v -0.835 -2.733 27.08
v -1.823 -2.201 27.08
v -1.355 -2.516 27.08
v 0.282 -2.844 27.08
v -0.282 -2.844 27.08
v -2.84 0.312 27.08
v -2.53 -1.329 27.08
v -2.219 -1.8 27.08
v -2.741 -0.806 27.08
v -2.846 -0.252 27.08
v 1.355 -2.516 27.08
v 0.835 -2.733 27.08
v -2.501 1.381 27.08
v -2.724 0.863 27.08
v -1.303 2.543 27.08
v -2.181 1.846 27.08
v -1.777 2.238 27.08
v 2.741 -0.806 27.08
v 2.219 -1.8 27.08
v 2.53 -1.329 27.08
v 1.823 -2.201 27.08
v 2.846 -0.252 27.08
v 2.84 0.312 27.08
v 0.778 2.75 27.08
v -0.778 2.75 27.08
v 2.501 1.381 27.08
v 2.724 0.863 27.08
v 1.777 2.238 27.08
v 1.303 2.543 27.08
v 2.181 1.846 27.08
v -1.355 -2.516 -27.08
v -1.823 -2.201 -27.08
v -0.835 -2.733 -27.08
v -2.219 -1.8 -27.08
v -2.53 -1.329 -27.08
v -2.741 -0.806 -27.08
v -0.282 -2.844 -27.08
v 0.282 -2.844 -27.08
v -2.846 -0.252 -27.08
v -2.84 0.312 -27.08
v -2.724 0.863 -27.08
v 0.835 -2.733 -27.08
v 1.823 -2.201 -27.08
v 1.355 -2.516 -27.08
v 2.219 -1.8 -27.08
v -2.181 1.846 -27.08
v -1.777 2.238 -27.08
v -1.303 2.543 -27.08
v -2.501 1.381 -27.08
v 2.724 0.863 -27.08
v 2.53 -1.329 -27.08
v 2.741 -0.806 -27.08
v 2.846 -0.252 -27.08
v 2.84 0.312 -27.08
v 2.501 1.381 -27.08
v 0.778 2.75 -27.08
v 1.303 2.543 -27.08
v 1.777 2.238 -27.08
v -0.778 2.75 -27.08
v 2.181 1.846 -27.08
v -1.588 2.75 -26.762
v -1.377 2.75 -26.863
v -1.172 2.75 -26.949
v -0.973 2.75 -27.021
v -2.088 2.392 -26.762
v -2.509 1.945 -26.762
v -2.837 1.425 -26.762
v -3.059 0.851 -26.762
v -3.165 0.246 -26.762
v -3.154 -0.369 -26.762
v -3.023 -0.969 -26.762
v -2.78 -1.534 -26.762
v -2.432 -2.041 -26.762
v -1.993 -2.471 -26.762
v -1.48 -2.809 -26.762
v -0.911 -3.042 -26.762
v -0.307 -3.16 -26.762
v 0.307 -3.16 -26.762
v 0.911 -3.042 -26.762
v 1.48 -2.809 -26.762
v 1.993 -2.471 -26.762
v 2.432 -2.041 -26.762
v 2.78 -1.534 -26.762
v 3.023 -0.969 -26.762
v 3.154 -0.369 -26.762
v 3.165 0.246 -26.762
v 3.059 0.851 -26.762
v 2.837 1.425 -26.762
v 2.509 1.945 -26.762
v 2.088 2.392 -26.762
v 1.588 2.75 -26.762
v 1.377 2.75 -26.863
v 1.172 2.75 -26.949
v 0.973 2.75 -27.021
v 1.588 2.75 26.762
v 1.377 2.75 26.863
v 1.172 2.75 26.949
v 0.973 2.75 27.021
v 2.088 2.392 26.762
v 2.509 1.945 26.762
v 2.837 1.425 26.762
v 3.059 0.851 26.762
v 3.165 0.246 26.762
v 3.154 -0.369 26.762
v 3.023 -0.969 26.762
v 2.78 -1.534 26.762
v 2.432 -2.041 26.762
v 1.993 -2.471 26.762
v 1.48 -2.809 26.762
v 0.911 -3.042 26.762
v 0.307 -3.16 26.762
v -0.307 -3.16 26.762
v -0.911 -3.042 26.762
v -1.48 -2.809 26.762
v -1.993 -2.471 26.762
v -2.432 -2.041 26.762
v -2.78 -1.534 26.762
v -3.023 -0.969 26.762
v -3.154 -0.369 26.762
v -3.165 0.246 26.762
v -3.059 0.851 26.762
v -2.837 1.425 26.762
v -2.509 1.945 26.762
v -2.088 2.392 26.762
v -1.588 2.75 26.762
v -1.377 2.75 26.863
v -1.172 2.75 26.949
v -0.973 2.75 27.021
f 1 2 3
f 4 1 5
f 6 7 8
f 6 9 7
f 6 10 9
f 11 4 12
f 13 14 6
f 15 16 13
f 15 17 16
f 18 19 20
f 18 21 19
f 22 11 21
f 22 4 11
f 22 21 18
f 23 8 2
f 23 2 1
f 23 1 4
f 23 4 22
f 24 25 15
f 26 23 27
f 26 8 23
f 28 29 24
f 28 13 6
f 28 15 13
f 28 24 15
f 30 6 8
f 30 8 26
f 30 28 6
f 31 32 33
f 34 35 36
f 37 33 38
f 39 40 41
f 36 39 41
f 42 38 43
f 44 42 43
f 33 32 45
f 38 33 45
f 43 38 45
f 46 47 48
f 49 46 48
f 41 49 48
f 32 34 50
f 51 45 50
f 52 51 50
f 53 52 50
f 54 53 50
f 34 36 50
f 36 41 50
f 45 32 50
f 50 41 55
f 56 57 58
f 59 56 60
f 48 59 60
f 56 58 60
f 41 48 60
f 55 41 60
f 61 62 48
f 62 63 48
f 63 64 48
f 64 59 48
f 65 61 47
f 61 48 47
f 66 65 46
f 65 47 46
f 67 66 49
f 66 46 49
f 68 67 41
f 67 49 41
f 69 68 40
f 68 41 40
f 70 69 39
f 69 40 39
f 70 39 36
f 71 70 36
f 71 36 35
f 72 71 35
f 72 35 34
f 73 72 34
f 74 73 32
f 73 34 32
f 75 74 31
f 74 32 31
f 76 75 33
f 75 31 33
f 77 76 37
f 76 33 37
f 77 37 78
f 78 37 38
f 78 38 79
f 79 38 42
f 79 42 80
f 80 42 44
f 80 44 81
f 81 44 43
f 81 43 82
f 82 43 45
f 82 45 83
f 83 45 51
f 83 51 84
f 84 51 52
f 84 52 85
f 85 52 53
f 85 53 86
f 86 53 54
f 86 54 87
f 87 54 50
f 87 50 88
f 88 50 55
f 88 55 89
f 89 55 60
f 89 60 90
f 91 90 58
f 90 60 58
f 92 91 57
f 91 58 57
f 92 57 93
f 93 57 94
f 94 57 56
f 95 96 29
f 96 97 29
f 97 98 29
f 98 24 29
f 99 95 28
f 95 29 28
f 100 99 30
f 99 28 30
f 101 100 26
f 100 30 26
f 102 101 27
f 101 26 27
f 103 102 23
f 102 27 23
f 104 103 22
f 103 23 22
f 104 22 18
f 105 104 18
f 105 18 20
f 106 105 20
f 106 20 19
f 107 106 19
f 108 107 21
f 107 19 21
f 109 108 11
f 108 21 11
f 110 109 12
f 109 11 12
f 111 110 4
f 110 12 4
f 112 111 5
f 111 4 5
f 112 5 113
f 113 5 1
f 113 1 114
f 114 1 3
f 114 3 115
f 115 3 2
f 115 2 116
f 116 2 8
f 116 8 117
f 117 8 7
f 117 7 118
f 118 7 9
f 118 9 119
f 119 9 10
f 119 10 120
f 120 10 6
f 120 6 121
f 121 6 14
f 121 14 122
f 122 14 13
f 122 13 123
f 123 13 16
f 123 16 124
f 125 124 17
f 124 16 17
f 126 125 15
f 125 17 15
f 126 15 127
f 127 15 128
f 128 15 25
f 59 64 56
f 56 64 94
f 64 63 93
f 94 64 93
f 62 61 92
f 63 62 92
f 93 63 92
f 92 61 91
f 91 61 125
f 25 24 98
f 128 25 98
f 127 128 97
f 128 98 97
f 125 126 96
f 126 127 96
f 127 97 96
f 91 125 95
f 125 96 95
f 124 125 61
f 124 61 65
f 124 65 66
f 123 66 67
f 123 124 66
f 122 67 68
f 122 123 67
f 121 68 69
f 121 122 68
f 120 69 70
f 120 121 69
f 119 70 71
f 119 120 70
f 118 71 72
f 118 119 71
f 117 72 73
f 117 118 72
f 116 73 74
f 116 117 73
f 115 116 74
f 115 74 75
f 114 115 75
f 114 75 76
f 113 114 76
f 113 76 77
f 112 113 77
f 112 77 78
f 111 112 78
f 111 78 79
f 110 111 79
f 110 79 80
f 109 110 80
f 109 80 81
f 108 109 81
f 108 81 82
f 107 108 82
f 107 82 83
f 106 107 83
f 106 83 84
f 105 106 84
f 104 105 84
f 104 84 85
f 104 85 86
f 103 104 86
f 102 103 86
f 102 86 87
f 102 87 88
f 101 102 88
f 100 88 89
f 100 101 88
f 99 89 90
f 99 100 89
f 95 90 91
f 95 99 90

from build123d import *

# Parameters (mm, degrees)
SKETCH3_R                = 3.175
BOSS_EXTRUDE2_DEPTH      = 27.08
BOSS_EXTRUDE2_DEPTH_BACK = 27.08
CUT_EXTRUDE5_DEPTH       = 28.08
CUT_EXTRUDE5_DEPTH_BACK  = 28.08
CHAMFER1_SIZE            = 0.3175


with BuildPart() as part:
    # Sketch3 → Boss-Extrude2 (new body, two sides)
    with BuildSketch(Plane.XY) as boss_extrude2_sk:
        Circle(SKETCH3_R)
    extrude(amount=BOSS_EXTRUDE2_DEPTH)
    extrude(boss_extrude2_sk.sketch, amount=-BOSS_EXTRUDE2_DEPTH_BACK)

    # Sketch10 → Cut-Extrude5 (cut, two sides)
    with BuildSketch(Plane.XY) as cut_extrude5_sk:
        with BuildLine():
            Line((-1.5875, 2.749630657), (1.5875, 2.749630657))
            ThreePointArc((1.5875, 2.749630657), (0, 3.175), (-1.5875, 2.749630657))
        make_face()
    extrude(amount=CUT_EXTRUDE5_DEPTH, mode=Mode.SUBTRACT)
    extrude(cut_extrude5_sk.sketch, amount=-CUT_EXTRUDE5_DEPTH_BACK, mode=Mode.SUBTRACT)

    # Chamfer1
    chamfer1_edges = [part.edges().sort_by_distance(p)[0] for p in [
        (0, -3.175, -27.08),
        (0, -3.175, 27.08),
    ]]
    chamfer(chamfer1_edges, length=CHAMFER1_SIZE)


solid = part.part
